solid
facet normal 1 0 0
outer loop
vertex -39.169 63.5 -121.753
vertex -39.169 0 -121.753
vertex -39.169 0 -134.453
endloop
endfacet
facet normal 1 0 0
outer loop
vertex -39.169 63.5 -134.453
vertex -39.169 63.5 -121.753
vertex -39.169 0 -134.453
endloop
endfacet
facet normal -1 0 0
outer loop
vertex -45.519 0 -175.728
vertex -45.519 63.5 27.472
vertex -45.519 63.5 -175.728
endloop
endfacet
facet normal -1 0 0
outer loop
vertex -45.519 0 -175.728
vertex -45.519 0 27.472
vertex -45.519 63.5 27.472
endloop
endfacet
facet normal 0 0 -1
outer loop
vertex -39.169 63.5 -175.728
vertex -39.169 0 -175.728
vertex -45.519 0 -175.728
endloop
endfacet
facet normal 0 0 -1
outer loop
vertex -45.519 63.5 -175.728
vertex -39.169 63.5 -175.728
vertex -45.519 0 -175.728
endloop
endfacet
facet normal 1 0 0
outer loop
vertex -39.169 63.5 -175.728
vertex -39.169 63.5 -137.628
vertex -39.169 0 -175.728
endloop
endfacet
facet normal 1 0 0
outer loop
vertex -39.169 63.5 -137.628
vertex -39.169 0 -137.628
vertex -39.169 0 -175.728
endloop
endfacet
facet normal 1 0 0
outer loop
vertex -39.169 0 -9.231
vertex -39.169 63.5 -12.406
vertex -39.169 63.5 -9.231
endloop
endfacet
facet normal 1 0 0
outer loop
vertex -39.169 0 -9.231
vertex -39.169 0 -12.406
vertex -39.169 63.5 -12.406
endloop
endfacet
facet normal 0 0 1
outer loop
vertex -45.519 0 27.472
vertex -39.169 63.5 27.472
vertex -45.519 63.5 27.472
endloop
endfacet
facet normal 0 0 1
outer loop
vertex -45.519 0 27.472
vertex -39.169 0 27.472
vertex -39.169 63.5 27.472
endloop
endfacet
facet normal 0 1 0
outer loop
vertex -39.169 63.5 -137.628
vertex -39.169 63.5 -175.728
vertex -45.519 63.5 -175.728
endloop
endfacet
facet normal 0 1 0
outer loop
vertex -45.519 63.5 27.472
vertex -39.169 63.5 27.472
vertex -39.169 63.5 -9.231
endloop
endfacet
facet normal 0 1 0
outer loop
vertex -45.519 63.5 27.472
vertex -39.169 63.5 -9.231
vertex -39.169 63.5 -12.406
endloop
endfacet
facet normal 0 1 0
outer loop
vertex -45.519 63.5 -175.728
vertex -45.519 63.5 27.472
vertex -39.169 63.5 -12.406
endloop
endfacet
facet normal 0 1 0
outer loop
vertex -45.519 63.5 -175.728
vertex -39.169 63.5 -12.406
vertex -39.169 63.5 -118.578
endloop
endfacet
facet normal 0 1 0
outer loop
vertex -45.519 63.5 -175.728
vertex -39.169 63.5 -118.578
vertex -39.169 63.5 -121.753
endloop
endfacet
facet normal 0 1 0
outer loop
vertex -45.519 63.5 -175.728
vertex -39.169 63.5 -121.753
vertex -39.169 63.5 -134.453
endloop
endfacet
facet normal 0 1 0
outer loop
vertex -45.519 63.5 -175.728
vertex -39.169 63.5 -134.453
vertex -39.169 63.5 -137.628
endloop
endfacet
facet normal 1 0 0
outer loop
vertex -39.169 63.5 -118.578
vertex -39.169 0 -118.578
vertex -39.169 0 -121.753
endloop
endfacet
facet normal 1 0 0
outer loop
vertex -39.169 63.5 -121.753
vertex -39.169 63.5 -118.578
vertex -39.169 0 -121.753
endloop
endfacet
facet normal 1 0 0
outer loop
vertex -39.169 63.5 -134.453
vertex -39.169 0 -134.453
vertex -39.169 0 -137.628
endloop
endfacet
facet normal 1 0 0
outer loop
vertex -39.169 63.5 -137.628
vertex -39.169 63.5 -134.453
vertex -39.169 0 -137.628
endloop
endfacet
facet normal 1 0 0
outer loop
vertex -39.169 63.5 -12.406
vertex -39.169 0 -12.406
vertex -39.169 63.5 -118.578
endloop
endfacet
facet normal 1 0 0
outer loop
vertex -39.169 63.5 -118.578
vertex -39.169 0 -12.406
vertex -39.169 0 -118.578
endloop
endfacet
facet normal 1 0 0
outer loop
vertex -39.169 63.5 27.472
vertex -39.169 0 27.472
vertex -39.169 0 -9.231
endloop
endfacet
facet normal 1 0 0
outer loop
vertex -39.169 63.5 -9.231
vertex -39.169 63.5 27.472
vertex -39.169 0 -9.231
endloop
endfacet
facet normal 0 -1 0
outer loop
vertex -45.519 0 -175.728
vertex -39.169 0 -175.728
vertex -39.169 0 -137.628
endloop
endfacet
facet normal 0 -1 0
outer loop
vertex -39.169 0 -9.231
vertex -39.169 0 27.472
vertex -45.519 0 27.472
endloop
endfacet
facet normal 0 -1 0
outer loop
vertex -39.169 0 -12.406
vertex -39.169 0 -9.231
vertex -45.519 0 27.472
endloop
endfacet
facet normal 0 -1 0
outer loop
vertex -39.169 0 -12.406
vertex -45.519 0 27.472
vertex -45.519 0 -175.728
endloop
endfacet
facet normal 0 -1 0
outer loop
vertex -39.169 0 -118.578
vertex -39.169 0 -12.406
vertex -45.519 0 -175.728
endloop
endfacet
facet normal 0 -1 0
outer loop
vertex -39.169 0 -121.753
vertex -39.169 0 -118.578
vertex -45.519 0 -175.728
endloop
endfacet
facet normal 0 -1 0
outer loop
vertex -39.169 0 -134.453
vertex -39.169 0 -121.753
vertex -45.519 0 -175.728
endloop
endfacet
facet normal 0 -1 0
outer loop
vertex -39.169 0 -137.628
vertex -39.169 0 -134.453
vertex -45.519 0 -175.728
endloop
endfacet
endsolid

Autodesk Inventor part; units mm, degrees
ref_plane "YZ Plane" through (0, 0, 0) normal (1, 0, 0) x (0, 1, 0)
ref_plane "XZ Plane" through (0, 0, 0) normal (0, 1, 0) x (-1, 0, 0)
ref_plane "XY Plane" through (0, 0, 0) normal (0, 0, 1) x (1, 0, 0)
sketch "Sketch1" plane through (0, 0, 0) normal (0, 1, 0) x (-1, 0, 0)
  line L0 (39.1686, 27.4724) -> (39.1686, -175.7276)
  line L1 (45.5186, 27.4724) -> (45.5186, -175.7276)
  line L2 (39.1686, -134.4526) -> (39.1686, -137.6276)
  line L3 (39.1686, -175.7276) -> (45.5186, -175.7276)
  line L4 (39.1686, 27.4724) -> (45.5186, 27.4724)
  line L5 (39.1686, -118.5776) -> (39.1686, -121.7526)
  line L6 (39.1686, -12.4056) -> (39.1686, -9.2306)
  point P0 (0, 0)
  dimension "d0" = 6.35
  dimension "d5" = 203.2
extrude "Extrusion1" add sketch "Sketch1" along normal blind 63.5
properties part number "Dish_Front_Base"
